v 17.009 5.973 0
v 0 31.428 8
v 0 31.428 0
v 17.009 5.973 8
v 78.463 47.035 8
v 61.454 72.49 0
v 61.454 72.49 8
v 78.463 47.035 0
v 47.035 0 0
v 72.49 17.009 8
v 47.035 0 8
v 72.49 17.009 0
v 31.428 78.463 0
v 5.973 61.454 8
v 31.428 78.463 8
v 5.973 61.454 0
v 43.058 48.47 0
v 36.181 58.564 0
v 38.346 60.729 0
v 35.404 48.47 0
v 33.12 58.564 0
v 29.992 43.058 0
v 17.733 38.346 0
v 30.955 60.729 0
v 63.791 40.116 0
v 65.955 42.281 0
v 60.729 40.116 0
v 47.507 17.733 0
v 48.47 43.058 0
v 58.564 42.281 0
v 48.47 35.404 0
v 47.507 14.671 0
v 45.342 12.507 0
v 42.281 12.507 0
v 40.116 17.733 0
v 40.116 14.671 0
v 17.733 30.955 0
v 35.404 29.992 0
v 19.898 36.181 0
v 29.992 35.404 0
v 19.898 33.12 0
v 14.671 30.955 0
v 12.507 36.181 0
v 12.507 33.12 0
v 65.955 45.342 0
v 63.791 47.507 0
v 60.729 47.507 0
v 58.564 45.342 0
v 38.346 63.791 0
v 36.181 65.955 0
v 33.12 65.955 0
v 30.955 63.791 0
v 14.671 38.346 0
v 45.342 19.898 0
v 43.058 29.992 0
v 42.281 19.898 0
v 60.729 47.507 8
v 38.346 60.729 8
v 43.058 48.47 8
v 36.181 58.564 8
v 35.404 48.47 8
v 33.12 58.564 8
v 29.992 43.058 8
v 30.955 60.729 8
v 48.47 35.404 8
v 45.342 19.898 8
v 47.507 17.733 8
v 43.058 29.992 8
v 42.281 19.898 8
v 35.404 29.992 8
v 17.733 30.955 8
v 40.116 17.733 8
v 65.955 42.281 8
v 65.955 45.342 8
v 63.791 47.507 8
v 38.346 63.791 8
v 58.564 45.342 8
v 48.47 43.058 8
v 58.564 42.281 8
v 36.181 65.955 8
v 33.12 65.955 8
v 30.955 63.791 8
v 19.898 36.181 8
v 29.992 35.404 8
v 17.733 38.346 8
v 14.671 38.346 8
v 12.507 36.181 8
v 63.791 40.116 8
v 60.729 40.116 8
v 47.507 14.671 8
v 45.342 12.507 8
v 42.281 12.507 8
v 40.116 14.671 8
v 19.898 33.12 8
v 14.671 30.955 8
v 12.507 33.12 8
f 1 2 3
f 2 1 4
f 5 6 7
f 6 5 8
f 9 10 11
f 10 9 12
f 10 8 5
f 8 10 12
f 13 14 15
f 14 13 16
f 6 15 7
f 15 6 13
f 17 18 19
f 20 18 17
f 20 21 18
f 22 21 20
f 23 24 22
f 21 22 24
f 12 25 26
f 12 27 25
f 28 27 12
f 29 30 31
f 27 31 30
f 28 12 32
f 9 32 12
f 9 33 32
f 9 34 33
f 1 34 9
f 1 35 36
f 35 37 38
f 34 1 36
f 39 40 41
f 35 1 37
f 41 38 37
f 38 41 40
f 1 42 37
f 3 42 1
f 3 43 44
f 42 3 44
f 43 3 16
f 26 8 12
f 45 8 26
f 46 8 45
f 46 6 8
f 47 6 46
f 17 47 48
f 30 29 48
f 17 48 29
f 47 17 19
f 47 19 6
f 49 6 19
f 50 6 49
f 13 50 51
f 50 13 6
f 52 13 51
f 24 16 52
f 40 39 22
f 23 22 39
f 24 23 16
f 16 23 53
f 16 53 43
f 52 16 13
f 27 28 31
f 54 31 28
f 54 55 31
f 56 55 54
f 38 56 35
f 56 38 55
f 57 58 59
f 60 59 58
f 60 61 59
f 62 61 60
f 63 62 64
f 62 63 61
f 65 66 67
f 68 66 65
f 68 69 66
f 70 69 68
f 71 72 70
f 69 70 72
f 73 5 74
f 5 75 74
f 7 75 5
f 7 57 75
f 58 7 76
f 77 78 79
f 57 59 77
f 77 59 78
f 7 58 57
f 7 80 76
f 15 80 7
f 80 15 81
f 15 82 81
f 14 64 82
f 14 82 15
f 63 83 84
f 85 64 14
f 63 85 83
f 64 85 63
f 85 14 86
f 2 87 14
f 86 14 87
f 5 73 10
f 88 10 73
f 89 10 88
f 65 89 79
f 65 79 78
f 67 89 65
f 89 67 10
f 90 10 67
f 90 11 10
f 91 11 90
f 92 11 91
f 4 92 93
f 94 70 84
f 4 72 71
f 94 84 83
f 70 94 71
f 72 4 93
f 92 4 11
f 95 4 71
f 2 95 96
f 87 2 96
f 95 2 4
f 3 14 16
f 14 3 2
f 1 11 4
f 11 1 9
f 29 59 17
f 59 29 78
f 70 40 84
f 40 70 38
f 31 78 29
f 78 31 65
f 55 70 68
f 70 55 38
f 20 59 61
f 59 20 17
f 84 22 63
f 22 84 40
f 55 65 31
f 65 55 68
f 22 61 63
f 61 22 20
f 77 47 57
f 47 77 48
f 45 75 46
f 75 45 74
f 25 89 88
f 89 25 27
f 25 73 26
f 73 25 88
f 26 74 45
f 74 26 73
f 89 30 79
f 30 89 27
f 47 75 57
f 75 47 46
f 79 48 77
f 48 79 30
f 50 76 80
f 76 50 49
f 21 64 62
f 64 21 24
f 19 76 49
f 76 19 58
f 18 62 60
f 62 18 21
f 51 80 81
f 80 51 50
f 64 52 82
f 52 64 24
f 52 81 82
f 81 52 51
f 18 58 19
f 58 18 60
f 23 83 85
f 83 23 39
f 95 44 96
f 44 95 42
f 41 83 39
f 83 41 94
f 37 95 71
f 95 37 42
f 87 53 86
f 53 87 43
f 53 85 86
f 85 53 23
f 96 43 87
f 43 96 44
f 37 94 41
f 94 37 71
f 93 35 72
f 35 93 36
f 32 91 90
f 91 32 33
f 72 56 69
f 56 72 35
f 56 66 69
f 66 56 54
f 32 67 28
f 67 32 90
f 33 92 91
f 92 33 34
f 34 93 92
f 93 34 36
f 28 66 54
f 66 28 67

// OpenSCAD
$fn = 32;

// ----------------------------------------------------------------------
// Polygon plate: 8-gon R40, 4 bolt windows
// ----------------------------------------------------------------------

// --- parameters (mm) ---
sides = 8;                // number of polygon sides
plate_r = 40;             // circumscribed radius of the polygon
bore_r = 10;              // centre bore radius
bolts = 4;                // number of bolt windows
ring_r = 23.48;           // bolt-circle radius
bolt_r = 4;               // bolt window radius
plate_t = 8;              // plate thickness, Z (extrusion height)
fit_tol = 0.05;           // declared fit tolerance (prompt contract)
free_tol = 0.3;           // declared free tolerance (prompt contract)

plate_d = 2 * plate_r;  // circumscribed diameter
bore_d = 2 * bore_r;  // centre bore diameter
bolt_d = 2 * bolt_r;  // bolt window diameter
ring_d = 2 * ring_r;  // bolt-circle diameter

profile = [[78.463, 47.035], [61.454, 72.49], [31.428, 78.463], [5.973, 61.454], [0, 31.428], [17.009, 5.973], [47.035, 0], [72.49, 17.009]];  // primary outline, 8 points, counter clockwise
void_1 = [[48.47, 43.058], [43.058, 48.47], [35.404, 48.47], [29.992, 43.058], [29.992, 35.404], [35.404, 29.992], [43.058, 29.992], [48.47, 35.404]];  // centre bore, 8 points
void_2 = [[65.955, 45.342], [63.791, 47.507], [60.729, 47.507], [58.564, 45.342], [58.564, 42.281], [60.729, 40.116], [63.791, 40.116], [65.955, 42.281]];  // bolt window 1, 8 points
void_3 = [[38.346, 63.791], [36.181, 65.955], [33.12, 65.955], [30.955, 63.791], [30.955, 60.729], [33.12, 58.564], [36.181, 58.564], [38.346, 60.729]];  // bolt window 2, 8 points
void_4 = [[19.898, 36.181], [17.733, 38.346], [14.671, 38.346], [12.507, 36.181], [12.507, 33.12], [14.671, 30.955], [17.733, 30.955], [19.898, 33.12]];  // bolt window 3, 8 points
void_5 = [[47.507, 17.733], [45.342, 19.898], [42.281, 19.898], [40.116, 17.733], [40.116, 14.671], [42.281, 12.507], [45.342, 12.507], [47.507, 14.671]];  // bolt window 4, 8 points

// --- the one profile operation ---
difference() {
  linear_extrude(height = plate_t) polygon(points = profile);
  translate([0, 0, -1])
    linear_extrude(height = plate_t + 2) polygon(points = void_1);
  translate([0, 0, -1])
    linear_extrude(height = plate_t + 2) polygon(points = void_2);
  translate([0, 0, -1])
    linear_extrude(height = plate_t + 2) polygon(points = void_3);
  translate([0, 0, -1])
    linear_extrude(height = plate_t + 2) polygon(points = void_4);
  translate([0, 0, -1])
    linear_extrude(height = plate_t + 2) polygon(points = void_5);
}
